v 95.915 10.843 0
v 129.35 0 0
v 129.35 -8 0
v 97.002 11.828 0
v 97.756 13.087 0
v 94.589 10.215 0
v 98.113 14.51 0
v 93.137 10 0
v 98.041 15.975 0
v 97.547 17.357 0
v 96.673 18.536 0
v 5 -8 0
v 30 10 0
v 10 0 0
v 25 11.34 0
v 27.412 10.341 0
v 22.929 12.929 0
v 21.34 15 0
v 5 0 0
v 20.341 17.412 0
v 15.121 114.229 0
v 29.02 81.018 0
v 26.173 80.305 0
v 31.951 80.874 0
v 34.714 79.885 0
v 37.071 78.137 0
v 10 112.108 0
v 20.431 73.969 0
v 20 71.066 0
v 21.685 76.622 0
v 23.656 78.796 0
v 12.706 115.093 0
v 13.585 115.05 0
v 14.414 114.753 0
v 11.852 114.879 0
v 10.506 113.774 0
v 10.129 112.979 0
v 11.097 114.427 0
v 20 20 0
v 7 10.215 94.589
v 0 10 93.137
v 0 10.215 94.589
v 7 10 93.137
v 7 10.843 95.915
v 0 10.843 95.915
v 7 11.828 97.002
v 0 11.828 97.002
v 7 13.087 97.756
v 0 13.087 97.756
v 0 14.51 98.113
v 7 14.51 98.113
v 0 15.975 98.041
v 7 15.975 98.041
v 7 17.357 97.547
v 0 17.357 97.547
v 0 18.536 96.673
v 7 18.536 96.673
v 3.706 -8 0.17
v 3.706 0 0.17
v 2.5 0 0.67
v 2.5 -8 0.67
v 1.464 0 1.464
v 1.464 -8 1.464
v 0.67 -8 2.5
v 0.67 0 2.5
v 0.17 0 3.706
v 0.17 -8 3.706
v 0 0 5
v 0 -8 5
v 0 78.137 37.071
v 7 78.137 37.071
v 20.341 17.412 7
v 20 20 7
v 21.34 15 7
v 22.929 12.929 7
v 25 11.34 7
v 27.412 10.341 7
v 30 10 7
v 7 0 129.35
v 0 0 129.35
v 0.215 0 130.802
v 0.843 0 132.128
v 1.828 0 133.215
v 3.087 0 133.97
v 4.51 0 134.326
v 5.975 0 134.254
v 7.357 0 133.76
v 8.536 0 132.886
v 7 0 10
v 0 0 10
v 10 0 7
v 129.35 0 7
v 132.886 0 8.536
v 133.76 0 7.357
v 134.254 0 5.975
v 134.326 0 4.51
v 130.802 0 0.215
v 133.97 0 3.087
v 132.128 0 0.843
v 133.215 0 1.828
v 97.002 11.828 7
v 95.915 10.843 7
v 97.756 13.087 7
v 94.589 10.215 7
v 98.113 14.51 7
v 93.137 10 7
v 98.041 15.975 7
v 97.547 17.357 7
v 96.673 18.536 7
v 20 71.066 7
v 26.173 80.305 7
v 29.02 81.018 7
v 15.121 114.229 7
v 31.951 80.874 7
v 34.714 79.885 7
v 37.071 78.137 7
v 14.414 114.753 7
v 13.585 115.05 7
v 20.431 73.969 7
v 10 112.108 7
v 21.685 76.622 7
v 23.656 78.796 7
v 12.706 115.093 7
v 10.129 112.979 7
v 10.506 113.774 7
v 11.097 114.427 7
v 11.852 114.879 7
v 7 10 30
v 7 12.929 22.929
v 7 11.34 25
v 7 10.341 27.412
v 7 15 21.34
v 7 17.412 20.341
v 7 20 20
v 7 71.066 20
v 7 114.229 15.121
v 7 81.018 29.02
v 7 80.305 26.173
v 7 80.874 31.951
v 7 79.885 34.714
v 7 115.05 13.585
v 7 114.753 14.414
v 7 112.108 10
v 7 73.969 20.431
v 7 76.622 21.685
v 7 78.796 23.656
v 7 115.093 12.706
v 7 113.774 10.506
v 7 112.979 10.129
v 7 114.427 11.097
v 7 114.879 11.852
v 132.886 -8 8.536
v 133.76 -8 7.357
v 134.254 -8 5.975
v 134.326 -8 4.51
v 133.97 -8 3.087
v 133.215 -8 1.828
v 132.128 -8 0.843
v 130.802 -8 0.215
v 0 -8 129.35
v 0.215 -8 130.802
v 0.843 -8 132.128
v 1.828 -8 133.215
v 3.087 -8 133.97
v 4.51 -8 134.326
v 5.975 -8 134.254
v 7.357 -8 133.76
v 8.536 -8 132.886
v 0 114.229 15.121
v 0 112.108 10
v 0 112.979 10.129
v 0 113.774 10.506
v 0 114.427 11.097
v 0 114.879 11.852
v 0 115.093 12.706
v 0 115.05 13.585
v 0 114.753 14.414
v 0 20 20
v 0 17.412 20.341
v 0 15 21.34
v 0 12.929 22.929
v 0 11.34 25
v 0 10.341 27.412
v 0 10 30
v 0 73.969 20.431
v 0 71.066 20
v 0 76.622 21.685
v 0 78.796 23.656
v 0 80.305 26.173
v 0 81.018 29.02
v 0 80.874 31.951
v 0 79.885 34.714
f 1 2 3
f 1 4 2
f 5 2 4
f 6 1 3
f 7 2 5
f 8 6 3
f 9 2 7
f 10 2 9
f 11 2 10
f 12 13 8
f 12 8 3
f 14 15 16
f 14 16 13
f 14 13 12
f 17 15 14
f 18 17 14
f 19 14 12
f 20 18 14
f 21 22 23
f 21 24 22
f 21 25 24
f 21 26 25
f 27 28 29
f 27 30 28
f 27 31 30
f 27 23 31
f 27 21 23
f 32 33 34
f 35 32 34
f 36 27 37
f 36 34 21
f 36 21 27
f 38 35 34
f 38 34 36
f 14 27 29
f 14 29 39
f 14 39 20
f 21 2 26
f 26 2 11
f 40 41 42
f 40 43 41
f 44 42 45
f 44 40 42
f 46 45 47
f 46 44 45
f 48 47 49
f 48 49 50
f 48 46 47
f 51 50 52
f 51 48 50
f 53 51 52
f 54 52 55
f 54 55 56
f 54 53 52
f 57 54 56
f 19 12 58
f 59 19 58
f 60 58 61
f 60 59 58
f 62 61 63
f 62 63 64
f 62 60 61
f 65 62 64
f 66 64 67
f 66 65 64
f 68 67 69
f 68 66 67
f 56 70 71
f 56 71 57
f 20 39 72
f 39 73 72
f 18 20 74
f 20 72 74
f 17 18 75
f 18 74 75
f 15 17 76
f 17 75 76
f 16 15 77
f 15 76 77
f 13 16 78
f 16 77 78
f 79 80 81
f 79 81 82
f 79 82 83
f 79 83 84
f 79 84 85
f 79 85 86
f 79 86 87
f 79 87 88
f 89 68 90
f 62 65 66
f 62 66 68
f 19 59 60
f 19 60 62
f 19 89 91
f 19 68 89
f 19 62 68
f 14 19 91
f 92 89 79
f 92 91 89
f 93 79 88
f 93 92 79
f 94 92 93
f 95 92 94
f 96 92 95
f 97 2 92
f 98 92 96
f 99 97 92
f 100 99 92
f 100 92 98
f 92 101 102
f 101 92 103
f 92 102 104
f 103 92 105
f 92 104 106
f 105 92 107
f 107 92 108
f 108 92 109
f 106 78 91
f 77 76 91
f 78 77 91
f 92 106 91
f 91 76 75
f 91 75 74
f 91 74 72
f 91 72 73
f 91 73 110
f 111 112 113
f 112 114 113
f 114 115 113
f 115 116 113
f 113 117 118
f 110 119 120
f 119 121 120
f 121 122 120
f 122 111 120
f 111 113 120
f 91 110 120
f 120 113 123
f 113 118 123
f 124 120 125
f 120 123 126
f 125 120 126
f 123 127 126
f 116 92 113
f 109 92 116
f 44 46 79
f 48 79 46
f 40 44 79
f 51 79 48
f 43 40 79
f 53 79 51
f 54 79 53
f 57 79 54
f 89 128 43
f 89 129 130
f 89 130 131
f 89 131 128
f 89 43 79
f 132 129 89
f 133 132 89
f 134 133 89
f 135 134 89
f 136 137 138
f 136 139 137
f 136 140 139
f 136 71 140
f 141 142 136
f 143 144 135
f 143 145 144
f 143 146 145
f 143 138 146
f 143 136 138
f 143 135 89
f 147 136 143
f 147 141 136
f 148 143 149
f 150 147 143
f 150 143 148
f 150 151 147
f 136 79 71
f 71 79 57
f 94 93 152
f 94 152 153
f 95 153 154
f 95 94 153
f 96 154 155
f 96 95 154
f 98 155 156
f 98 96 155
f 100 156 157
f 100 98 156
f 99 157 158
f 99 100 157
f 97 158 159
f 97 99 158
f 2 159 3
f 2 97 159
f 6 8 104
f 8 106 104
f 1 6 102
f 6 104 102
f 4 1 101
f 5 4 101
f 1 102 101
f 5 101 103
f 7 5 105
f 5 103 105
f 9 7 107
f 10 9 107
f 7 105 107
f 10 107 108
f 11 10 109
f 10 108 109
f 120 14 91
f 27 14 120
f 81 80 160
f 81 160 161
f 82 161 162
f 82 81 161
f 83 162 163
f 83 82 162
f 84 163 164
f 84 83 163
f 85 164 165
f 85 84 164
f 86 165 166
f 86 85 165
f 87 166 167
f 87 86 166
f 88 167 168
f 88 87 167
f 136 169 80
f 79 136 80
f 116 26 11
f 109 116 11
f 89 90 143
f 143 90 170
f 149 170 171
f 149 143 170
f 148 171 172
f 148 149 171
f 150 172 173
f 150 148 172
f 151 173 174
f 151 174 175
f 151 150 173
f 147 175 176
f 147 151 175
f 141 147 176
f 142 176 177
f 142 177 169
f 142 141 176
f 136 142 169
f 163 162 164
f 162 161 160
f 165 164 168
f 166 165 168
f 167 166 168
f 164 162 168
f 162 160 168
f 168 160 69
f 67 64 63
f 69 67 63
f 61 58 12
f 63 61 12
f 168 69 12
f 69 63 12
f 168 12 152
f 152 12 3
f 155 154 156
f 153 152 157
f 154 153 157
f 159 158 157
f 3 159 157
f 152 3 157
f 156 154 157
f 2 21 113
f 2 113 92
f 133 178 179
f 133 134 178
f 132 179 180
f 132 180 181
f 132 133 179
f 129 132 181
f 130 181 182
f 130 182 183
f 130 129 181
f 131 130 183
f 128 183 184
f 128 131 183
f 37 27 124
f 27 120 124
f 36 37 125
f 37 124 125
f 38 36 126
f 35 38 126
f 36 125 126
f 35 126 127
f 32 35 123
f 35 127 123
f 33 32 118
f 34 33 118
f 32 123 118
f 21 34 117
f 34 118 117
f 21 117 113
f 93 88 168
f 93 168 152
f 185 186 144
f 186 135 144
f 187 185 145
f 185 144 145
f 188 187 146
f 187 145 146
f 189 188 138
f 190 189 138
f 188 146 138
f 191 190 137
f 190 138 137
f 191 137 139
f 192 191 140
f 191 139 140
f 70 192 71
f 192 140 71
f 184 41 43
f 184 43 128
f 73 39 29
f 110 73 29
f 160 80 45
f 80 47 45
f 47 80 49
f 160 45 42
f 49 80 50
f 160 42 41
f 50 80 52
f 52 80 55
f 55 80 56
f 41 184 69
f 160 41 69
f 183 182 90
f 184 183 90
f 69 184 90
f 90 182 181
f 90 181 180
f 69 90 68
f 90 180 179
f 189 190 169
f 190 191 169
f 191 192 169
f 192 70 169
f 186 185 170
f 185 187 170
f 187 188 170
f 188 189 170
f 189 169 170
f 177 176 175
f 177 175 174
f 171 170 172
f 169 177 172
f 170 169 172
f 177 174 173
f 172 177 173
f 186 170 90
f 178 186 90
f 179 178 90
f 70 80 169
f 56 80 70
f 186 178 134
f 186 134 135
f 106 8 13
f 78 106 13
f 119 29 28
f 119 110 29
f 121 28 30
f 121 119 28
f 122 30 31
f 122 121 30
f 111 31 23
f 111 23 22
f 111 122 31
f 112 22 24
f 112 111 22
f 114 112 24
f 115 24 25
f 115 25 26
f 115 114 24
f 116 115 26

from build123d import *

# Parameters (mm, degrees)
BOSS_EXTRUDE1_DEPTH = 8
EXTRUDE_THIN1_DEPTH = 7
EXTRUDE_THIN2_DEPTH = 7
FILLET1_R           = 10
FILLET2_R           = 5
FILLET3_R           = 3


with BuildPart() as part:
    # Sketch1 → Boss-Extrude1 (new body)
    with BuildSketch(Plane(origin=(0, 0, 0), x_dir=(1, 0, 0), z_dir=(0, 1, 0))):
        with BuildLine():
            Line((8.535533906, -132.885822331), (132.885822331, -8.535533906))
            ThreePointArc((132.885822331, -8.535533906), (133.969686088, -3.086582838), (129.350288425, 0))
            Line((129.350288425, 0), (5, 0))
            ThreePointArc((5, 0), (1.464466094, -1.464466094), (0, -5))
            Line((0, -5), (0, -129.350288425))
            ThreePointArc((0, -129.350288425), (3.086582838, -133.969686088), (8.535533906, -132.885822331))
        make_face()
    extrude(amount=-BOSS_EXTRUDE1_DEPTH)

    # Sketch4 → Extrude-Thin1 (add)
    with BuildSketch(Plane(origin=(0, 0, 0), x_dir=(-1, 0, 0), z_dir=(0, 0, -1))):
        Polygon((-10, 0), (-10, 119.350288425), (-129.350288425, 0), align=None)
        Polygon((-20, 10), (-20, 95.208152802), (-105.208152802, 10), align=None, mode=Mode.SUBTRACT)
    extrude(amount=-EXTRUDE_THIN1_DEPTH)

    # Sketch5 → Extrude-Thin2 (add)
    with BuildSketch(Plane.ZY):
        Polygon((10, 0), (10, 119.350288425), (129.350288425, 0), align=None)
        Polygon((20, 10), (20, 95.208152802), (105.208152802, 10), align=None, mode=Mode.SUBTRACT)
    extrude(amount=-EXTRUDE_THIN2_DEPTH)

    # Fillet1
    fillet1_edges = [part.edges().sort_by_distance(p)[0] for p in [
        (20, 95.208152802, 3.5),
        (20, 10, 3.5),
        (3.5, 95.208152802, 20),
        (3.5, 10, 20),
    ]]
    fillet(fillet1_edges, radius=FILLET1_R)

    # Fillet2
    fillet2_edges = [part.edges().sort_by_distance(p)[0] for p in [
        (105.208152802, 10, 3.5),
        (3.5, 10, 105.208152802),
    ]]
    fillet(fillet2_edges, radius=FILLET2_R)

    # Fillet3
    fillet3_edges = [part.edges().sort_by_distance(p)[0] for p in [
        (10, 119.350288425, 3.5),
        (3.5, 119.350288425, 10),
    ]]
    fillet(fillet3_edges, radius=FILLET3_R)


solid = part.part
